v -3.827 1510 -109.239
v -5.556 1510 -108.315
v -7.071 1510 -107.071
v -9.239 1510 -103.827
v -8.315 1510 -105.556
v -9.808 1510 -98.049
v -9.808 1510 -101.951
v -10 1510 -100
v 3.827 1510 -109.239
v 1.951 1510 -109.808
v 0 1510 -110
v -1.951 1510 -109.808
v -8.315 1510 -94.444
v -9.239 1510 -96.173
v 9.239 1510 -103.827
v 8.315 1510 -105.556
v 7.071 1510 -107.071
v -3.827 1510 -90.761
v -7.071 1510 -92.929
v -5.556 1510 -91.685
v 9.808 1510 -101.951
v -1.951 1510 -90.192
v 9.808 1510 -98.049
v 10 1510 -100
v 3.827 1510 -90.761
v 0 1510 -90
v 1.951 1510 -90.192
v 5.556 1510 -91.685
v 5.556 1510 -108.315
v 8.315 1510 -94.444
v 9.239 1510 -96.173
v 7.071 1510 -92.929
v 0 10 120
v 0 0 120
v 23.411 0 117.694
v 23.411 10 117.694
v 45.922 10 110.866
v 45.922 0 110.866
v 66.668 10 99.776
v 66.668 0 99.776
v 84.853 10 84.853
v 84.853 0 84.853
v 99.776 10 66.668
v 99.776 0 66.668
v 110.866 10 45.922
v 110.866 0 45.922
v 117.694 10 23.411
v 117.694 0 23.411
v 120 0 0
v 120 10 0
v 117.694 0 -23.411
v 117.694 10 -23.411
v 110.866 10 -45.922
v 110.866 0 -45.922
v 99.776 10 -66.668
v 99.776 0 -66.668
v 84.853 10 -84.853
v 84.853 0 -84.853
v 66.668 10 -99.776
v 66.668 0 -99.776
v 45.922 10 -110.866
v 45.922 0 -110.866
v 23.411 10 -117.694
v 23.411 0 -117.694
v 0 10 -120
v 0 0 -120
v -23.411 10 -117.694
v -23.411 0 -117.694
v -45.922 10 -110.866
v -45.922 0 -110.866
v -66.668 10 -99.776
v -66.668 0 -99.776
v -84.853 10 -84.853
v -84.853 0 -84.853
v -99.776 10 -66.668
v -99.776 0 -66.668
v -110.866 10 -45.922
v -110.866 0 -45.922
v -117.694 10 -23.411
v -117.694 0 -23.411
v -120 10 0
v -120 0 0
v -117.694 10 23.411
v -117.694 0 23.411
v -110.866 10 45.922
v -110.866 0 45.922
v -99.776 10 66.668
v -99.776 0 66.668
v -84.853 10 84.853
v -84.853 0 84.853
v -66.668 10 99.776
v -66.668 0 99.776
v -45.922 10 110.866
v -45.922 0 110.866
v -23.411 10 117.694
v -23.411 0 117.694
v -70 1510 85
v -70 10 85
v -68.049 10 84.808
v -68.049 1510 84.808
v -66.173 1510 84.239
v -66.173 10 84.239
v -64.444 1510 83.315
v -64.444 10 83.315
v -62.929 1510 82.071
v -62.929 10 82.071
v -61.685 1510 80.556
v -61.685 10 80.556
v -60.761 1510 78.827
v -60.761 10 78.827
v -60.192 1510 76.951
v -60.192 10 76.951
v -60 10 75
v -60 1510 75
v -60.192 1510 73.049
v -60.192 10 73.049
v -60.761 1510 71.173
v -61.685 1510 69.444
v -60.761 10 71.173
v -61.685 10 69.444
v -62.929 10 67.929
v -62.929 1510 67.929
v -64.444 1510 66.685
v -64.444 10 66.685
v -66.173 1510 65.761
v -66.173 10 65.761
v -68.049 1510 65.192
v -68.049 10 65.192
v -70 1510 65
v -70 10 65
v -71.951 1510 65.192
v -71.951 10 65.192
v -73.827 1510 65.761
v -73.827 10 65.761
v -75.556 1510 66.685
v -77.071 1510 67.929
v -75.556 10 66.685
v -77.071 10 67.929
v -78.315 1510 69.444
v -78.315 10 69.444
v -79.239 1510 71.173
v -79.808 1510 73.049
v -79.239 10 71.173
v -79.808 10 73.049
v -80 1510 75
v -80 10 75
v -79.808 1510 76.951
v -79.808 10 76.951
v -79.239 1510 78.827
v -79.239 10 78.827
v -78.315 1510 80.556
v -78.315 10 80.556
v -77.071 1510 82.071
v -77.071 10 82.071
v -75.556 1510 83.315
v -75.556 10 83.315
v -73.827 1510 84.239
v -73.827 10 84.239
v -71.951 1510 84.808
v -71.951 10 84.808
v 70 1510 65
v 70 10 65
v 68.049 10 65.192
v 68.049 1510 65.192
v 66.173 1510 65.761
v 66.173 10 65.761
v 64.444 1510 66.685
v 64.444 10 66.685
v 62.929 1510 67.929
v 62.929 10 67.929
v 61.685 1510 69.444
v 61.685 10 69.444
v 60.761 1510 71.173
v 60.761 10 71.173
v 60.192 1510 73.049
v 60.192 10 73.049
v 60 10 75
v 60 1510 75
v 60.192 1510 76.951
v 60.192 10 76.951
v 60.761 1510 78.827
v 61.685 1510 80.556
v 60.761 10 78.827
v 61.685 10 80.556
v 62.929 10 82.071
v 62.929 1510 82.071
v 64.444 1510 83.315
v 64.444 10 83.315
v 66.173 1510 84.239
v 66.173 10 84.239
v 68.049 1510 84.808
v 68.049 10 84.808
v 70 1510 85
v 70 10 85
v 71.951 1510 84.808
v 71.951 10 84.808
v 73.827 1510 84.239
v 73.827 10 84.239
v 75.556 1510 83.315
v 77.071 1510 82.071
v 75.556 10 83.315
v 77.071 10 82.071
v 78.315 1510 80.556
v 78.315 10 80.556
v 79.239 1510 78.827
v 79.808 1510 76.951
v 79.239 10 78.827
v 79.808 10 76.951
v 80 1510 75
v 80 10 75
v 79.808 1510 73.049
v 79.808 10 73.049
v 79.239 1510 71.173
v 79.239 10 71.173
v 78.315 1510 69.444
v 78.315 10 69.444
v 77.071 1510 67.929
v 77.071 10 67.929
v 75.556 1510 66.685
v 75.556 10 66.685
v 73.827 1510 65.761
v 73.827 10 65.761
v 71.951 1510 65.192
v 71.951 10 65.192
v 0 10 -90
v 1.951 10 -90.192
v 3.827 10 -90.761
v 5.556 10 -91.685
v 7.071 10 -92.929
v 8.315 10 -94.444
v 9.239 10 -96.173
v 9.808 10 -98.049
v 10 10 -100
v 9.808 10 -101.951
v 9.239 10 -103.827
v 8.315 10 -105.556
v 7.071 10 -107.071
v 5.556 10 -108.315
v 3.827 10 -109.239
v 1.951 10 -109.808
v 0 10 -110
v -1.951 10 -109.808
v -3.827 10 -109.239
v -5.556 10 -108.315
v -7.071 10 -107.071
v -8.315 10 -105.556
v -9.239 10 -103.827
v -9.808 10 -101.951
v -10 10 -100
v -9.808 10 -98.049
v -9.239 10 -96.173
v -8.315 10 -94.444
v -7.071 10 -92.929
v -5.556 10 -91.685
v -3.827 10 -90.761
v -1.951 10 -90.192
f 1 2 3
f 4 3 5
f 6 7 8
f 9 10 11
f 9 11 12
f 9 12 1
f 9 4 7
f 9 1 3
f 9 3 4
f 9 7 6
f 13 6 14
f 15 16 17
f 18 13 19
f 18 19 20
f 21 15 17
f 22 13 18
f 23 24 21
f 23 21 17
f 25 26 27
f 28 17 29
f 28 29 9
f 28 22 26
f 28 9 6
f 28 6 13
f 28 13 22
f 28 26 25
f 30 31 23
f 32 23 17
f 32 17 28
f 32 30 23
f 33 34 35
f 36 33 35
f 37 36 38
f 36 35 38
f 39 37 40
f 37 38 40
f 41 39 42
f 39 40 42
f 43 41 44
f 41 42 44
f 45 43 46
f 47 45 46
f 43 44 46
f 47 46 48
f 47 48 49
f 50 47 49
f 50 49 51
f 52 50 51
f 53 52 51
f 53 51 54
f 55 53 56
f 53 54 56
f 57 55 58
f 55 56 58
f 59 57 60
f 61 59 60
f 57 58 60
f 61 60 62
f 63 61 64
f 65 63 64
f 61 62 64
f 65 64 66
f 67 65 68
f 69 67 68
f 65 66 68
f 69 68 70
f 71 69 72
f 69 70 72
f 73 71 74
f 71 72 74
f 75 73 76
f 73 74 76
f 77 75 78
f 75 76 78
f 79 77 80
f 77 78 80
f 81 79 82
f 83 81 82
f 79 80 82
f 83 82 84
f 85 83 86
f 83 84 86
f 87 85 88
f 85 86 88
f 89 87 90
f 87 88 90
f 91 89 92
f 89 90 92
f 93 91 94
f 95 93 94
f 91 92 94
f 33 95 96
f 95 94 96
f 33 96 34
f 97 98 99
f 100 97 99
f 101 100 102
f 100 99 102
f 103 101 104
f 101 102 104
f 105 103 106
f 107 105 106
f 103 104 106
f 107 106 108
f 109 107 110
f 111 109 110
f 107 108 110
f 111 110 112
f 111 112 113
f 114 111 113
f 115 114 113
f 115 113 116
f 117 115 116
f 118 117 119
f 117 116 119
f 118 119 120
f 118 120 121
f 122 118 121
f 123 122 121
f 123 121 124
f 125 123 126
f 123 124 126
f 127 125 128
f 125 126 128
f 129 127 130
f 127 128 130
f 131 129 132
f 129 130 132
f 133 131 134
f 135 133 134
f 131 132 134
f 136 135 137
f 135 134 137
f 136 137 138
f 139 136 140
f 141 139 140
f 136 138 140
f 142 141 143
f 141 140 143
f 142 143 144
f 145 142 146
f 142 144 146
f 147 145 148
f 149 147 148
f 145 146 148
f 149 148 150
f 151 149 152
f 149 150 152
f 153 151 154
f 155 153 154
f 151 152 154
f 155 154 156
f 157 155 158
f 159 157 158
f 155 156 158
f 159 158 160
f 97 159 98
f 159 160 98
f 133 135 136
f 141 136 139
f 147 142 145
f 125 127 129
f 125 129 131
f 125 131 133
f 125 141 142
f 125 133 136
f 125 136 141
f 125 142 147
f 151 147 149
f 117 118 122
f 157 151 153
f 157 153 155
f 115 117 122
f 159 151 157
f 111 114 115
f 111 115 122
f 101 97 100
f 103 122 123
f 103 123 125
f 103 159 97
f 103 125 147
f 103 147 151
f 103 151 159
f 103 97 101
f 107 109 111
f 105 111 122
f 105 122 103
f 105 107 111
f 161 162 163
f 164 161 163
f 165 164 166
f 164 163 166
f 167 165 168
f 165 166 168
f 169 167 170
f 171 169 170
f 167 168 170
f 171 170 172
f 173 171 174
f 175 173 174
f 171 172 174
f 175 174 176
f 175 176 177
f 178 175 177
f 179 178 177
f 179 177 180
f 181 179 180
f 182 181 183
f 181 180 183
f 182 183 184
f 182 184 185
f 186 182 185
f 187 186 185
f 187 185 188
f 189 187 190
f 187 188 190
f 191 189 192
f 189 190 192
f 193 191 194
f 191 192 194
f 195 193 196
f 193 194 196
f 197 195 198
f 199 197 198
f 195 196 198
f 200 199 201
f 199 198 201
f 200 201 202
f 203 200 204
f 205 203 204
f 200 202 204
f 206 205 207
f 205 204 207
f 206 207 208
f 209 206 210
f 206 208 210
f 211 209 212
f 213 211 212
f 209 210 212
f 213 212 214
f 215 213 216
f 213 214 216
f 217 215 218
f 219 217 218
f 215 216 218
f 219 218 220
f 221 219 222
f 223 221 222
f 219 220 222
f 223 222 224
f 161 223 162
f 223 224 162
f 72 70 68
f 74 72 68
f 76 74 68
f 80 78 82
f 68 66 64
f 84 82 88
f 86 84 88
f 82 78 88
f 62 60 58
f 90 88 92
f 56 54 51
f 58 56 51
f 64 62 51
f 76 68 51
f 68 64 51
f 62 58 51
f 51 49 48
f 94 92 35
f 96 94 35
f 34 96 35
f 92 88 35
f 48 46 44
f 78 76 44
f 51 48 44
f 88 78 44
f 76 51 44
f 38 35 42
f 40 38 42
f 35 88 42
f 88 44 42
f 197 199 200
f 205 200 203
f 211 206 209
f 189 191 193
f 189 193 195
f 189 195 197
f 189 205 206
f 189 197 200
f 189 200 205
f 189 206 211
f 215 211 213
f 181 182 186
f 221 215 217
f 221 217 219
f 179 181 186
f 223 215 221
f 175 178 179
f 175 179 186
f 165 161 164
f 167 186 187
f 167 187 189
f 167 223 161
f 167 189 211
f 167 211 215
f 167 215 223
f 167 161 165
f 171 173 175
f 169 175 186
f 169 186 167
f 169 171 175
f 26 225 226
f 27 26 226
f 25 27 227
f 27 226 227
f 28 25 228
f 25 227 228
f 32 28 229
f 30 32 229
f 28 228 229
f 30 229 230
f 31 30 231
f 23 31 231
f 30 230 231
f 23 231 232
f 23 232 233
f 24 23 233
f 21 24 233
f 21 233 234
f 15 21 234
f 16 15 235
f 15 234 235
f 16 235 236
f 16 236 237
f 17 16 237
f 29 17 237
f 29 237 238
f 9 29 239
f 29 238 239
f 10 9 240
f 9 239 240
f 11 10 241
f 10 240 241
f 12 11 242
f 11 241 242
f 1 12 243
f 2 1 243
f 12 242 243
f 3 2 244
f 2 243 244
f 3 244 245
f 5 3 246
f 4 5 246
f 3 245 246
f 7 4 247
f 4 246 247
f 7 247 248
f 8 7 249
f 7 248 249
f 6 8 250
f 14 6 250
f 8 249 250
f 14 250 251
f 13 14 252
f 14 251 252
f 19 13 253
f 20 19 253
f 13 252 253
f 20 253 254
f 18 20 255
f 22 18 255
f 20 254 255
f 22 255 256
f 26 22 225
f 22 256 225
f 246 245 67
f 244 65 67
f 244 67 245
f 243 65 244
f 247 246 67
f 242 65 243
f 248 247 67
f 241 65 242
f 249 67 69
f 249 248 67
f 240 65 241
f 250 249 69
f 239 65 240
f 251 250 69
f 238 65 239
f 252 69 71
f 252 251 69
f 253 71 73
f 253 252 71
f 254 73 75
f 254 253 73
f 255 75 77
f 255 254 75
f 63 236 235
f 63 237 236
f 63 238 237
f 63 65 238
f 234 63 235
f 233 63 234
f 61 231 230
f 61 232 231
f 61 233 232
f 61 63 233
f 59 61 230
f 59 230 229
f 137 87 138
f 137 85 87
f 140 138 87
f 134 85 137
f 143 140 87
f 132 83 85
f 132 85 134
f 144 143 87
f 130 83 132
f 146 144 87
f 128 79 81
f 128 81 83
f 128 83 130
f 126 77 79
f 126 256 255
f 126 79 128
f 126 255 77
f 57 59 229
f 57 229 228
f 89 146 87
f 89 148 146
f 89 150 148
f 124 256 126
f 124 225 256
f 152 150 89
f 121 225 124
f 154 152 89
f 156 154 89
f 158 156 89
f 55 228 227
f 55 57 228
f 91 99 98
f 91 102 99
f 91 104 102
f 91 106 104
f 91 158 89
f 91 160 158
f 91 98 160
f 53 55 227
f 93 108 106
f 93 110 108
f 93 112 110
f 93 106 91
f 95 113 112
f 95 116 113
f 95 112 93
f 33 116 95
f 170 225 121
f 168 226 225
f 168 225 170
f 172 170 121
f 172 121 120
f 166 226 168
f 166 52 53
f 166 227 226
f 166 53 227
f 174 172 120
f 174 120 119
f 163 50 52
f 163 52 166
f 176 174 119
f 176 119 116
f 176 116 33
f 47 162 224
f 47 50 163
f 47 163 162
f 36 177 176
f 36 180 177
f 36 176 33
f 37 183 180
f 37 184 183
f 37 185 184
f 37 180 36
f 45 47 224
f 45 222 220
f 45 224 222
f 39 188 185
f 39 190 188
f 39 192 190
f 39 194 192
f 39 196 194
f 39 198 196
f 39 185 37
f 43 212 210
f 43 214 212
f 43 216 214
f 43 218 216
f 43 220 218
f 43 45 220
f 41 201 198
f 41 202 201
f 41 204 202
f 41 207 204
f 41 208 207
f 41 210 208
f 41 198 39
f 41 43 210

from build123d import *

# Parameters (mm, degrees)
SKETCH1_R           = 120
BOSS_EXTRUDE1_DEPTH = 10
SKETCH2_R           = 10
BOSS_EXTRUDE2_DEPTH = 1500


with BuildPart() as part:
    # Sketch1 → Boss-Extrude1 (new body)
    with BuildSketch(Plane(origin=(0, 0, 0), x_dir=(1, 0, 0), z_dir=(0, 1, 0))):
        with Locations(Location((0, 0, 0), (0, 0, 270))):
            Circle(SKETCH1_R)
    extrude(amount=BOSS_EXTRUDE1_DEPTH)

    # Sketch2 → Boss-Extrude2 (add)
    with BuildSketch(Plane(origin=(0, 10, 0), x_dir=(1, 0, 0), z_dir=(0, 1, 0))):
        with Locations(Location((0, 100, 0), (0, 0, 270))):
            Circle(SKETCH2_R)
        with Locations(Location((-70, -75, 0), (0, 0, 270))):
            Circle(SKETCH2_R)
        with Locations(Location((70, -75, 0), (0, 0, 90))):
            Circle(SKETCH2_R)
    extrude(amount=BOSS_EXTRUDE2_DEPTH)


solid = part.part
